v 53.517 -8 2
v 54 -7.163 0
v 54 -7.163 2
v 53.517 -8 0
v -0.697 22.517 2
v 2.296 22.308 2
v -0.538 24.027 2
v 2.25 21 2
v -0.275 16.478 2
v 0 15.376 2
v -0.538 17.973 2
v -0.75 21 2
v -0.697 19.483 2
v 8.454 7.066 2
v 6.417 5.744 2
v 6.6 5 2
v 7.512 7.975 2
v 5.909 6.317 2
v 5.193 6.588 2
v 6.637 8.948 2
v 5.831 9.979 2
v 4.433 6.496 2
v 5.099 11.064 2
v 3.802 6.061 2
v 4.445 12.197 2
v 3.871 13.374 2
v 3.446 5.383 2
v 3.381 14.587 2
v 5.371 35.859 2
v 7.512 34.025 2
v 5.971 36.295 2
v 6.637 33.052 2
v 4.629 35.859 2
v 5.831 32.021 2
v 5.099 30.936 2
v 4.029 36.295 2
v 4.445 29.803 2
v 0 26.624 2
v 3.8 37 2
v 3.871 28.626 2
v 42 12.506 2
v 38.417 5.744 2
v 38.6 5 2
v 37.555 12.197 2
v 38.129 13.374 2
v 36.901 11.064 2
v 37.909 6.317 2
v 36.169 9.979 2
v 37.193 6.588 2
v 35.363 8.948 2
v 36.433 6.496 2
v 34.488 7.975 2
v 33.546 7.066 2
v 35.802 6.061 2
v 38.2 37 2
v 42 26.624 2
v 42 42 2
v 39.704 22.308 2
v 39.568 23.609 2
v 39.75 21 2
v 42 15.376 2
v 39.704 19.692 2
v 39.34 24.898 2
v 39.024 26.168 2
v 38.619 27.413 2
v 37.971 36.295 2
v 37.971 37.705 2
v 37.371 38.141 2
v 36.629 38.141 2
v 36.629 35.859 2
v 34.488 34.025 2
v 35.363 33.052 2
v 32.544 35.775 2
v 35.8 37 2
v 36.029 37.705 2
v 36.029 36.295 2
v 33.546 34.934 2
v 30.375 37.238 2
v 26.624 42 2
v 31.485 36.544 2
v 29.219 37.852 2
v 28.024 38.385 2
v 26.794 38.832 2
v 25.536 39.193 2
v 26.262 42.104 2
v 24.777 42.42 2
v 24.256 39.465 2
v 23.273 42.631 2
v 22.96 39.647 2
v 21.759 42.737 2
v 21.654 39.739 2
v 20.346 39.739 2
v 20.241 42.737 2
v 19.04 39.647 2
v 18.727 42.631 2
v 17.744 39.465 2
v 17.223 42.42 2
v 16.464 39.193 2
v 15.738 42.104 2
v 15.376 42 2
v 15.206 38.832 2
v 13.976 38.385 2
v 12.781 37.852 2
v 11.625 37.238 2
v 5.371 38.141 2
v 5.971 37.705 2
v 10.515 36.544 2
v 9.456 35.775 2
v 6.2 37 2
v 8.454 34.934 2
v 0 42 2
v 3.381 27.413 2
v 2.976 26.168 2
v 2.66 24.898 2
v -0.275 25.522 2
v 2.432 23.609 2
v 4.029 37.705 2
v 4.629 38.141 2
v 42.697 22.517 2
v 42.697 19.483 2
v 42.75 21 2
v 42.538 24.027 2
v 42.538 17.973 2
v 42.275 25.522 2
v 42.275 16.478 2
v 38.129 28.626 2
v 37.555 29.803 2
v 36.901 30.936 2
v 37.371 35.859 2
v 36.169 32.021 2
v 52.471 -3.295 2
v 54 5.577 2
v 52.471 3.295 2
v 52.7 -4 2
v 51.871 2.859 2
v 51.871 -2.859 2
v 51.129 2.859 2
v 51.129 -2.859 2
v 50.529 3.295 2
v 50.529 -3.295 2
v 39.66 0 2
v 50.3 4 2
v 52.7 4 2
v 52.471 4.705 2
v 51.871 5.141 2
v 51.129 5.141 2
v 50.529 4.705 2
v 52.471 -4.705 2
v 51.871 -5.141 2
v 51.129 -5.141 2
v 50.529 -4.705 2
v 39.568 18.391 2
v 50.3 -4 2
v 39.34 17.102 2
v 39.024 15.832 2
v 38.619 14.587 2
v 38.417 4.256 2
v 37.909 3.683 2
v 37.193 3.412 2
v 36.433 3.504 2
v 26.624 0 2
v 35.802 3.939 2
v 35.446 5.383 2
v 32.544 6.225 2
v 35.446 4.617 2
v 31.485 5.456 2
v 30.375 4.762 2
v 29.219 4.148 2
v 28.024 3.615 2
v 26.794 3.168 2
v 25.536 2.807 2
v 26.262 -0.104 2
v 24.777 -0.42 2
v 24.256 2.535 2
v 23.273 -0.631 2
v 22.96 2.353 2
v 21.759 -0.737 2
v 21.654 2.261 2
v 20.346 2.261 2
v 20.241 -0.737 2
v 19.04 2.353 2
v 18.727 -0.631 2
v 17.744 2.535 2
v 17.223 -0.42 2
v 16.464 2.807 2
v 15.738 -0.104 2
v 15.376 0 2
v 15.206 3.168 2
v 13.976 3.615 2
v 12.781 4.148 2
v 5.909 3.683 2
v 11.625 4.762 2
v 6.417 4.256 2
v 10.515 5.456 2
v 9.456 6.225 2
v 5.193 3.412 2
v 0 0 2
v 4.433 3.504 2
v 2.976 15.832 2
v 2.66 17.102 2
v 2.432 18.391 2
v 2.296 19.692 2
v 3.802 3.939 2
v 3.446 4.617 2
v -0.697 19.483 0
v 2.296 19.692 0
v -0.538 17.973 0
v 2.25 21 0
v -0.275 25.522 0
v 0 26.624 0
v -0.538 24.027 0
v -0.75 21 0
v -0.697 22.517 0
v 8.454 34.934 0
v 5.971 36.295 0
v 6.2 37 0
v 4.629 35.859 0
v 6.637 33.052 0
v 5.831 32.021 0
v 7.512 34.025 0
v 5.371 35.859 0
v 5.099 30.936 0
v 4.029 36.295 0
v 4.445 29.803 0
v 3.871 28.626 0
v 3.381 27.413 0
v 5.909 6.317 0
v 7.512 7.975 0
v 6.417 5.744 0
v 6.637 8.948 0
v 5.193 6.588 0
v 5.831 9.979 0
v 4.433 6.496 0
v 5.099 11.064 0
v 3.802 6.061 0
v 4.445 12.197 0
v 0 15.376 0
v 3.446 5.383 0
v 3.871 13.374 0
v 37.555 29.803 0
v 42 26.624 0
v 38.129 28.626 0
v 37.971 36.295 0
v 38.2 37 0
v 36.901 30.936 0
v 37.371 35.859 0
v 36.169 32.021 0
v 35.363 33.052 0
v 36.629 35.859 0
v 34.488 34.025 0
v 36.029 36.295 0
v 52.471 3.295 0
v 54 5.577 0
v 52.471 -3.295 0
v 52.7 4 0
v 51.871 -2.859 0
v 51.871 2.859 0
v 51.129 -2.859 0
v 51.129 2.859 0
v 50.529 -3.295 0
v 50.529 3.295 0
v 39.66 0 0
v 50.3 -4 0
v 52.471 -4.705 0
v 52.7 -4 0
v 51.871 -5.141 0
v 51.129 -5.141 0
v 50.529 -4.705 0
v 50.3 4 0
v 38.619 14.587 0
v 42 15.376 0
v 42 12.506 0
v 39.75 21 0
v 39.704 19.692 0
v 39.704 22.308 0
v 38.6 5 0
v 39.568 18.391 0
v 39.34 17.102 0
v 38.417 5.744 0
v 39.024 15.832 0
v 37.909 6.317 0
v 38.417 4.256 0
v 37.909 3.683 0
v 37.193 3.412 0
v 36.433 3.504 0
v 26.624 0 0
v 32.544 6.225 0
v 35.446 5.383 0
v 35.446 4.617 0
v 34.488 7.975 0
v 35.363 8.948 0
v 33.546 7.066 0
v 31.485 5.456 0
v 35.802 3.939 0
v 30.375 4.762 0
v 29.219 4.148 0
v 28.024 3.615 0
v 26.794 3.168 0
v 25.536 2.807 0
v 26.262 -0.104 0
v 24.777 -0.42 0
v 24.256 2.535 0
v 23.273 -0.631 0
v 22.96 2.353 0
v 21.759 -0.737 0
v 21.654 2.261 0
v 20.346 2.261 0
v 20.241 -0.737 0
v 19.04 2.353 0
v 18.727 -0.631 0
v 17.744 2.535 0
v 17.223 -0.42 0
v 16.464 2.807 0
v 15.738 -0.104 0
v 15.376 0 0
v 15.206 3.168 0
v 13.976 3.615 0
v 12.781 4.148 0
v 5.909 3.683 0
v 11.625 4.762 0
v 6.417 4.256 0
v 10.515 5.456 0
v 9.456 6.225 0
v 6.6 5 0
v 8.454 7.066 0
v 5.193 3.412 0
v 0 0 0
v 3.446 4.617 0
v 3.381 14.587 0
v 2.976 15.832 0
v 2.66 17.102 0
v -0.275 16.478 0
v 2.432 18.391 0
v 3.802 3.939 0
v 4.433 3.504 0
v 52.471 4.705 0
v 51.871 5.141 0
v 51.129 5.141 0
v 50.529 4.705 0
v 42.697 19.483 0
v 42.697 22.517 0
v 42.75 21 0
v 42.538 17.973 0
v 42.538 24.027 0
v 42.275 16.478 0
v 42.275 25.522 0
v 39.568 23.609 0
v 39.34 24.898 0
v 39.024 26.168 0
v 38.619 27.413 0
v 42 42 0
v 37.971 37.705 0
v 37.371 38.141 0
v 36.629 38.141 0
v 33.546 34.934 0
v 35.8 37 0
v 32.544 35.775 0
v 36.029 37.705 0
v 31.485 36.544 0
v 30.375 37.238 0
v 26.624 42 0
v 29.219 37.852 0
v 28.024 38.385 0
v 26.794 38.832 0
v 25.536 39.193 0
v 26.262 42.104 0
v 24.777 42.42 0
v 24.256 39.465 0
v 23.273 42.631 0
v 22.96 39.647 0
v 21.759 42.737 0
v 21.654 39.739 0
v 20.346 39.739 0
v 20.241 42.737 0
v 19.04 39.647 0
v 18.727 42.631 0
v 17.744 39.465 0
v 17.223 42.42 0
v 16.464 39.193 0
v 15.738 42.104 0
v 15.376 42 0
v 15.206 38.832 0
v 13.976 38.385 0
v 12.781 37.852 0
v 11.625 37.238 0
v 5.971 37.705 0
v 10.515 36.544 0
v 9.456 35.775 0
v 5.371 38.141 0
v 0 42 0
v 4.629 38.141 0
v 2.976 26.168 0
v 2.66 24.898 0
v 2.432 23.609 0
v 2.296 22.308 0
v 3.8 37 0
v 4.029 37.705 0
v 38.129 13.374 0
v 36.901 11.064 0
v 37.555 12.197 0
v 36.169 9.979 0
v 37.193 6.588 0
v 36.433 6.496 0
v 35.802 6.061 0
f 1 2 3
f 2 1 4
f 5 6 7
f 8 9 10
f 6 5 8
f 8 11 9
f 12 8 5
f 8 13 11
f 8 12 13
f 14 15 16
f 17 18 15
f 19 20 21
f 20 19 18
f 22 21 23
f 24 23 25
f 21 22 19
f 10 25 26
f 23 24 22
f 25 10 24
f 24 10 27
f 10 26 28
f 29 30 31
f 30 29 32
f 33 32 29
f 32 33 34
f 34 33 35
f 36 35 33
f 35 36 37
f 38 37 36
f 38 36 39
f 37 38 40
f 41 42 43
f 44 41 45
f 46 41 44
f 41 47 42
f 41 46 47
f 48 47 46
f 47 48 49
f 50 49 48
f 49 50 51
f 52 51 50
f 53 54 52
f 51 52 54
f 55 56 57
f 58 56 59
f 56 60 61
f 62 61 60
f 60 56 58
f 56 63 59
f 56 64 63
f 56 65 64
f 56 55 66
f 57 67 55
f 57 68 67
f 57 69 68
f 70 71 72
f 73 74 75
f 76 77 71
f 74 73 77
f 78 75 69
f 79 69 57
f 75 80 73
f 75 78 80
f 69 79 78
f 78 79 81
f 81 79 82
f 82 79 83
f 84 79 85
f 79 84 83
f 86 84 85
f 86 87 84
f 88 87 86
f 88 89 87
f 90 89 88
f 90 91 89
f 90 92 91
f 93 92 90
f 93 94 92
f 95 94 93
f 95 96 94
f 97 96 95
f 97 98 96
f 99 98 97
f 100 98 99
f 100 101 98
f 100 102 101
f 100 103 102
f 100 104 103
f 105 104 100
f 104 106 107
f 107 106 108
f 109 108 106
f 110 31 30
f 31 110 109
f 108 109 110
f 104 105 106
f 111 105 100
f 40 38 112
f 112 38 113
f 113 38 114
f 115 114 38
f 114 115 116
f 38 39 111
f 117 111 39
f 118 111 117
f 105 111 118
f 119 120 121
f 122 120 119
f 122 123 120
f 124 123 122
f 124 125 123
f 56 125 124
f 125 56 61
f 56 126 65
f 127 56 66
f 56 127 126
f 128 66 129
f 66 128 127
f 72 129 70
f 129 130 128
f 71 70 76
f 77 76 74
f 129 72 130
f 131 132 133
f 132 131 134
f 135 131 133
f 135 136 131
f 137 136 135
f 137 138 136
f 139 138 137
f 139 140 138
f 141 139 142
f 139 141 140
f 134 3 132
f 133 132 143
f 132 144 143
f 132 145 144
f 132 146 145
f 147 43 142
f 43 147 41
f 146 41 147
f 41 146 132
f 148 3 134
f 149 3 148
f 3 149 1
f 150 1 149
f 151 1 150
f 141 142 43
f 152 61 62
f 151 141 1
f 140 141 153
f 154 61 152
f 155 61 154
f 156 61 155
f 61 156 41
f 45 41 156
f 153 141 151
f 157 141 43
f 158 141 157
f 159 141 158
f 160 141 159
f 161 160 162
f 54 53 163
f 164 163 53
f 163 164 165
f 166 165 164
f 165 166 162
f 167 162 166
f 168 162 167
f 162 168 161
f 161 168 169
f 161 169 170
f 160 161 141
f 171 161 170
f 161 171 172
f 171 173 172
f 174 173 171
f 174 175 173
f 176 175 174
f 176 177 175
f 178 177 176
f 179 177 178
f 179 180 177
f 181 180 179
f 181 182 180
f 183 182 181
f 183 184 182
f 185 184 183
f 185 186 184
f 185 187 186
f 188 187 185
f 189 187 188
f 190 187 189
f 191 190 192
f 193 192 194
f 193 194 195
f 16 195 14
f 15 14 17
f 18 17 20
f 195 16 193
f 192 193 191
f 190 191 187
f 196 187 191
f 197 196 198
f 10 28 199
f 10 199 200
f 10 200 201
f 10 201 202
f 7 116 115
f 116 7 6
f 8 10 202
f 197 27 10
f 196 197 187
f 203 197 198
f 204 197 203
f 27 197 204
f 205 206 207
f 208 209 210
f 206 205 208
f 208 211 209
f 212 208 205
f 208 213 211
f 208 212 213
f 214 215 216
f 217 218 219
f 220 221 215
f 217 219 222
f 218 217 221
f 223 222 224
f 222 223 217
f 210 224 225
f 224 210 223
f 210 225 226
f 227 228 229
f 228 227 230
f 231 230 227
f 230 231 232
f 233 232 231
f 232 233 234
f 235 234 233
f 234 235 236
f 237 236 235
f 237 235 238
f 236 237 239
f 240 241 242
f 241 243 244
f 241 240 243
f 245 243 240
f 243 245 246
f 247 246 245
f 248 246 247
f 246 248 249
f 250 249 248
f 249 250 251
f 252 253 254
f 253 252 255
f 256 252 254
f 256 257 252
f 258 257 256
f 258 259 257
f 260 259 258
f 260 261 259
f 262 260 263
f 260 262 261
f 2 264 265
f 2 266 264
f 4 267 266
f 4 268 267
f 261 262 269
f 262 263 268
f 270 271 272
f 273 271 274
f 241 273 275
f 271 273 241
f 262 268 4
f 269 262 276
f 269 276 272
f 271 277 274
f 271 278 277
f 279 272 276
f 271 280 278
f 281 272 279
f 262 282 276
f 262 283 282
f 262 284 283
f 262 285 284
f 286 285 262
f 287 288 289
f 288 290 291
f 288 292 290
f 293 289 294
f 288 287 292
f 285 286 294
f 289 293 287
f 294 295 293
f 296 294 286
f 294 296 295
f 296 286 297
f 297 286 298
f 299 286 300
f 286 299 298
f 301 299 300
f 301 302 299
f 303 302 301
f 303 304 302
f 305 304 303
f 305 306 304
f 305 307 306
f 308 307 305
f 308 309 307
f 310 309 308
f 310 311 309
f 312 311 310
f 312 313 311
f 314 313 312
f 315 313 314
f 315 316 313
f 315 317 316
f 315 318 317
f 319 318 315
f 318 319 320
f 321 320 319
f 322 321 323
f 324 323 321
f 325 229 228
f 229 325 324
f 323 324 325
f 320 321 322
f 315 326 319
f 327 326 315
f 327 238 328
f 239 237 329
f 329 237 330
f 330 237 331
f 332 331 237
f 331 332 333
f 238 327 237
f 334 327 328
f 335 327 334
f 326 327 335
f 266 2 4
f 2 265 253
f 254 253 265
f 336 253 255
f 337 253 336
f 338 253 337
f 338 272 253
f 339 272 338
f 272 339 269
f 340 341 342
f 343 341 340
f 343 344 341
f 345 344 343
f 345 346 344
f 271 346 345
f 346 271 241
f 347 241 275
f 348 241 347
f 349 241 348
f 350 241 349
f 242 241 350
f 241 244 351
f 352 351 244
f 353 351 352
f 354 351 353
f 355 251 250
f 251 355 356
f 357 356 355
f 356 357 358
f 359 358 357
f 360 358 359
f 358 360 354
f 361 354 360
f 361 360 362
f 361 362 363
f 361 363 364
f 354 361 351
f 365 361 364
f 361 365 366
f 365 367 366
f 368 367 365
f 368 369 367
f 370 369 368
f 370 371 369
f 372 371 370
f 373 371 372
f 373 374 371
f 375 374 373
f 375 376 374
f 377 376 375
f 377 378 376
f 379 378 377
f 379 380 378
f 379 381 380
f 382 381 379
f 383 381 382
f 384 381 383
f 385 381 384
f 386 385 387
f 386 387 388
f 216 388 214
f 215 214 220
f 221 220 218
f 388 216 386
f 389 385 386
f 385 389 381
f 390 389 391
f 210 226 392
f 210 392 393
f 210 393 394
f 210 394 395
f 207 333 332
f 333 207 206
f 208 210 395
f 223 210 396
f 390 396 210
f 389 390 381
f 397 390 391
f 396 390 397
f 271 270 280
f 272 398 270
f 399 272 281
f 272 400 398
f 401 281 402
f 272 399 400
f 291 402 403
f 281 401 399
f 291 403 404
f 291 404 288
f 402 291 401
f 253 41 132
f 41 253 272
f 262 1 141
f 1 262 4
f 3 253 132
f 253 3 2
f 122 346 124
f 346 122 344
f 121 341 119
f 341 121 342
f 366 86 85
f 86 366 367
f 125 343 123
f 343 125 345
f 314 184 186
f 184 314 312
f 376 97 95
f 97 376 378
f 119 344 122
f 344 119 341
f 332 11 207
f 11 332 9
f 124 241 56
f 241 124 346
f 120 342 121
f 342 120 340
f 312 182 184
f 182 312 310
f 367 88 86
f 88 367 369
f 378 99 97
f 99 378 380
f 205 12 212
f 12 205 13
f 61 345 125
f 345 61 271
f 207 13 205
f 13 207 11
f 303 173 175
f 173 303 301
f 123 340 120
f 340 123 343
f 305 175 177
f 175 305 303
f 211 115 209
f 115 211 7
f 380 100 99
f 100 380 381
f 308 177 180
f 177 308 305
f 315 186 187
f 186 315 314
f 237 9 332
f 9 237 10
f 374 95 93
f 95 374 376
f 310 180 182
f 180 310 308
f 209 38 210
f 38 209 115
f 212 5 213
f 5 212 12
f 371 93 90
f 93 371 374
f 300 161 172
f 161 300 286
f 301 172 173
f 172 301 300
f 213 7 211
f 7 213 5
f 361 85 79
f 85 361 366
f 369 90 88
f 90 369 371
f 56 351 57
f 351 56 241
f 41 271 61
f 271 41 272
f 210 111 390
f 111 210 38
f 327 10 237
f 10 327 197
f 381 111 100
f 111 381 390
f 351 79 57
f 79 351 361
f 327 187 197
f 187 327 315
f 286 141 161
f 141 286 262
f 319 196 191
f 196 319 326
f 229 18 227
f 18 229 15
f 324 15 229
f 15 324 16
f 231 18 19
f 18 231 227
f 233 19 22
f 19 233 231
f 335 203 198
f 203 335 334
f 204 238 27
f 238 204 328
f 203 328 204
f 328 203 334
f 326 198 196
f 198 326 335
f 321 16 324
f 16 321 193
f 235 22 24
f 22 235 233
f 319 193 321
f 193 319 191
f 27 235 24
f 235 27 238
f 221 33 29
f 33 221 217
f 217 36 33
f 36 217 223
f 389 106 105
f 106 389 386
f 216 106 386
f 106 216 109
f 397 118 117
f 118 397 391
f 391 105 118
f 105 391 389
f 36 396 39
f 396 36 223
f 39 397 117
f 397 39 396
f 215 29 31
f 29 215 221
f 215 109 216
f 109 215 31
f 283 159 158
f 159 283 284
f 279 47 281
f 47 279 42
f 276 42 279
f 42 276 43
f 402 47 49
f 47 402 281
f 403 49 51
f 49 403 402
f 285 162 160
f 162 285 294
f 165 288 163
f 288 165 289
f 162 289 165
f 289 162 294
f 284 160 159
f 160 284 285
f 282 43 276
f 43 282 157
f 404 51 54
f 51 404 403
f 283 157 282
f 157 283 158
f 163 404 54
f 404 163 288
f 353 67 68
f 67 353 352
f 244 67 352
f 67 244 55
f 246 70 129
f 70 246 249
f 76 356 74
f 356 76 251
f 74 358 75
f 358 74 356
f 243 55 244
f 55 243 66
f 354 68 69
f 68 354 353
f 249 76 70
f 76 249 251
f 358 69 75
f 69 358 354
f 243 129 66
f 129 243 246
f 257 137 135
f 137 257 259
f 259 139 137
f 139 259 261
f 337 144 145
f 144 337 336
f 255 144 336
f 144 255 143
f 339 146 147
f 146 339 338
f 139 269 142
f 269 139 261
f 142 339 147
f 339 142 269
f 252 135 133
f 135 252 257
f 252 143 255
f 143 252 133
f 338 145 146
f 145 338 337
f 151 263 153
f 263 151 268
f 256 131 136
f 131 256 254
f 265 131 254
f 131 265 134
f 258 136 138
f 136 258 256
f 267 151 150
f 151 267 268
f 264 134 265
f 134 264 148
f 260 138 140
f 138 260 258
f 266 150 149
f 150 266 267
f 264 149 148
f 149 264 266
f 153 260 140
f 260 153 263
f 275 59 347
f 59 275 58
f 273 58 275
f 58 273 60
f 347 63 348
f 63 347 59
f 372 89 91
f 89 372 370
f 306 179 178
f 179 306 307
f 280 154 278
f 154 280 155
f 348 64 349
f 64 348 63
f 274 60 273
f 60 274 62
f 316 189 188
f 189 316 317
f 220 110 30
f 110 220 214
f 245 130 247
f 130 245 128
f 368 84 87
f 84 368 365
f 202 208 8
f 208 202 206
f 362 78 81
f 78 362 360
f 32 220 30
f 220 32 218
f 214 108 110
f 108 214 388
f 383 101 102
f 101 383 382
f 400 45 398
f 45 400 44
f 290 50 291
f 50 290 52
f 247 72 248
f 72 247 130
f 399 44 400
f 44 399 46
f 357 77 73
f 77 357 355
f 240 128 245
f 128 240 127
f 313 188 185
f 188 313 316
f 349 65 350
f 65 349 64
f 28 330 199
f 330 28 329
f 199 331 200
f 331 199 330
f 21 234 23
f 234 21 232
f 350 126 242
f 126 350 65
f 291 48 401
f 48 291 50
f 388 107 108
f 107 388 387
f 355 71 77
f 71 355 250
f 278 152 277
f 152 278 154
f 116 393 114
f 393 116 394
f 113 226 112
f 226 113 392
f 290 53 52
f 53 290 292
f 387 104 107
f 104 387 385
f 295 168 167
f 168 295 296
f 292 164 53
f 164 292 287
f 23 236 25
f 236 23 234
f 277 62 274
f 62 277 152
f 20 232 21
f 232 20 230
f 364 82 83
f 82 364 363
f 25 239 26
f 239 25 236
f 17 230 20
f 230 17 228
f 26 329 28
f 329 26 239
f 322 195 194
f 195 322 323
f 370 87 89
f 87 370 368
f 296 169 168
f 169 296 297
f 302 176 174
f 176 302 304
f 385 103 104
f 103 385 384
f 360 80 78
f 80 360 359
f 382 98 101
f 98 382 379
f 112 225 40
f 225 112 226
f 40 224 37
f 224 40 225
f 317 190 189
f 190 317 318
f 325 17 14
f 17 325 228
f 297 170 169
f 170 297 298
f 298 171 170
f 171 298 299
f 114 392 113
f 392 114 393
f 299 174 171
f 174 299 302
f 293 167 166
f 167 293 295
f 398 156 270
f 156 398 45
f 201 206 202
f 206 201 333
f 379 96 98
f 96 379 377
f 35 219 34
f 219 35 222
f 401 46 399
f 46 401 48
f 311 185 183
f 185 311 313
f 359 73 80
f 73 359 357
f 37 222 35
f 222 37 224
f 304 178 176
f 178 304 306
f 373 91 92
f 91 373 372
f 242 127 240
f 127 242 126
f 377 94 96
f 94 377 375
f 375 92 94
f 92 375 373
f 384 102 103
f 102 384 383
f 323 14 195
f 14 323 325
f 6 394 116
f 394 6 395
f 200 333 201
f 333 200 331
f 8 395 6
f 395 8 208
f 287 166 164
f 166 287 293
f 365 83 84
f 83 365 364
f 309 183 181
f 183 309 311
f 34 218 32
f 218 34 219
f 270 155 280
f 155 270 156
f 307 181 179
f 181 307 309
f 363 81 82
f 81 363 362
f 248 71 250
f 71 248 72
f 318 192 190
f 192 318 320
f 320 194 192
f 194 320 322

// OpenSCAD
$fs=0.8; // def 1, 0.2 is high res
$fa=4;//def 12, 3 is very nice
%translate([0,0,-0.5])cube([200,200,1],center=true); //build platform

//Fan Spacer
sc = 32; //Screw Centres

hole = 37.5;  //fan hole
x=42;
y=42;
z=2;

module fan_mount_arm() {
	difference() {   
		translate([31,5,0]) rotate([0,0,-30]) cube([26,12,2]);
		translate([54,-10,-1]) cube([30,30,4]);
	}
}

module body_shape() {
	translate([x/2,x/2,0]) cylinder(z,(hole+6)/2,(hole+6)/2);
	cube([x,y,z]); //outer block
	fan_mount_arm();
}

module screw_holes() {
	//fan holes
	translate([(x-sc)/2,(x-sc)/2,-.1]) cylinder(3,1.6,1.6);
	translate([(x-sc)/2,(x-sc)/2 + sc,-.1]) cylinder(3,1.2,1.2);
	translate([(x-sc)/2 + sc,(x-sc)/2,-.1]) cylinder(3,1.6,1.6);
	translate([(x-sc)/2 + sc,(x-sc)/2 + sc,-.1]) cylinder(3,1.2,1.2);

	translate([51.5,4,-.1]) cylinder(3,1.2,1.2);
	translate([51.5,-4,-.1]) cylinder(3,1.2,1.2);
}

difference() {
	body_shape();
	translate([x/2,x/2,-.1]) cylinder(20,hole/2,hole/2); //fan hole
	screw_holes();
}
